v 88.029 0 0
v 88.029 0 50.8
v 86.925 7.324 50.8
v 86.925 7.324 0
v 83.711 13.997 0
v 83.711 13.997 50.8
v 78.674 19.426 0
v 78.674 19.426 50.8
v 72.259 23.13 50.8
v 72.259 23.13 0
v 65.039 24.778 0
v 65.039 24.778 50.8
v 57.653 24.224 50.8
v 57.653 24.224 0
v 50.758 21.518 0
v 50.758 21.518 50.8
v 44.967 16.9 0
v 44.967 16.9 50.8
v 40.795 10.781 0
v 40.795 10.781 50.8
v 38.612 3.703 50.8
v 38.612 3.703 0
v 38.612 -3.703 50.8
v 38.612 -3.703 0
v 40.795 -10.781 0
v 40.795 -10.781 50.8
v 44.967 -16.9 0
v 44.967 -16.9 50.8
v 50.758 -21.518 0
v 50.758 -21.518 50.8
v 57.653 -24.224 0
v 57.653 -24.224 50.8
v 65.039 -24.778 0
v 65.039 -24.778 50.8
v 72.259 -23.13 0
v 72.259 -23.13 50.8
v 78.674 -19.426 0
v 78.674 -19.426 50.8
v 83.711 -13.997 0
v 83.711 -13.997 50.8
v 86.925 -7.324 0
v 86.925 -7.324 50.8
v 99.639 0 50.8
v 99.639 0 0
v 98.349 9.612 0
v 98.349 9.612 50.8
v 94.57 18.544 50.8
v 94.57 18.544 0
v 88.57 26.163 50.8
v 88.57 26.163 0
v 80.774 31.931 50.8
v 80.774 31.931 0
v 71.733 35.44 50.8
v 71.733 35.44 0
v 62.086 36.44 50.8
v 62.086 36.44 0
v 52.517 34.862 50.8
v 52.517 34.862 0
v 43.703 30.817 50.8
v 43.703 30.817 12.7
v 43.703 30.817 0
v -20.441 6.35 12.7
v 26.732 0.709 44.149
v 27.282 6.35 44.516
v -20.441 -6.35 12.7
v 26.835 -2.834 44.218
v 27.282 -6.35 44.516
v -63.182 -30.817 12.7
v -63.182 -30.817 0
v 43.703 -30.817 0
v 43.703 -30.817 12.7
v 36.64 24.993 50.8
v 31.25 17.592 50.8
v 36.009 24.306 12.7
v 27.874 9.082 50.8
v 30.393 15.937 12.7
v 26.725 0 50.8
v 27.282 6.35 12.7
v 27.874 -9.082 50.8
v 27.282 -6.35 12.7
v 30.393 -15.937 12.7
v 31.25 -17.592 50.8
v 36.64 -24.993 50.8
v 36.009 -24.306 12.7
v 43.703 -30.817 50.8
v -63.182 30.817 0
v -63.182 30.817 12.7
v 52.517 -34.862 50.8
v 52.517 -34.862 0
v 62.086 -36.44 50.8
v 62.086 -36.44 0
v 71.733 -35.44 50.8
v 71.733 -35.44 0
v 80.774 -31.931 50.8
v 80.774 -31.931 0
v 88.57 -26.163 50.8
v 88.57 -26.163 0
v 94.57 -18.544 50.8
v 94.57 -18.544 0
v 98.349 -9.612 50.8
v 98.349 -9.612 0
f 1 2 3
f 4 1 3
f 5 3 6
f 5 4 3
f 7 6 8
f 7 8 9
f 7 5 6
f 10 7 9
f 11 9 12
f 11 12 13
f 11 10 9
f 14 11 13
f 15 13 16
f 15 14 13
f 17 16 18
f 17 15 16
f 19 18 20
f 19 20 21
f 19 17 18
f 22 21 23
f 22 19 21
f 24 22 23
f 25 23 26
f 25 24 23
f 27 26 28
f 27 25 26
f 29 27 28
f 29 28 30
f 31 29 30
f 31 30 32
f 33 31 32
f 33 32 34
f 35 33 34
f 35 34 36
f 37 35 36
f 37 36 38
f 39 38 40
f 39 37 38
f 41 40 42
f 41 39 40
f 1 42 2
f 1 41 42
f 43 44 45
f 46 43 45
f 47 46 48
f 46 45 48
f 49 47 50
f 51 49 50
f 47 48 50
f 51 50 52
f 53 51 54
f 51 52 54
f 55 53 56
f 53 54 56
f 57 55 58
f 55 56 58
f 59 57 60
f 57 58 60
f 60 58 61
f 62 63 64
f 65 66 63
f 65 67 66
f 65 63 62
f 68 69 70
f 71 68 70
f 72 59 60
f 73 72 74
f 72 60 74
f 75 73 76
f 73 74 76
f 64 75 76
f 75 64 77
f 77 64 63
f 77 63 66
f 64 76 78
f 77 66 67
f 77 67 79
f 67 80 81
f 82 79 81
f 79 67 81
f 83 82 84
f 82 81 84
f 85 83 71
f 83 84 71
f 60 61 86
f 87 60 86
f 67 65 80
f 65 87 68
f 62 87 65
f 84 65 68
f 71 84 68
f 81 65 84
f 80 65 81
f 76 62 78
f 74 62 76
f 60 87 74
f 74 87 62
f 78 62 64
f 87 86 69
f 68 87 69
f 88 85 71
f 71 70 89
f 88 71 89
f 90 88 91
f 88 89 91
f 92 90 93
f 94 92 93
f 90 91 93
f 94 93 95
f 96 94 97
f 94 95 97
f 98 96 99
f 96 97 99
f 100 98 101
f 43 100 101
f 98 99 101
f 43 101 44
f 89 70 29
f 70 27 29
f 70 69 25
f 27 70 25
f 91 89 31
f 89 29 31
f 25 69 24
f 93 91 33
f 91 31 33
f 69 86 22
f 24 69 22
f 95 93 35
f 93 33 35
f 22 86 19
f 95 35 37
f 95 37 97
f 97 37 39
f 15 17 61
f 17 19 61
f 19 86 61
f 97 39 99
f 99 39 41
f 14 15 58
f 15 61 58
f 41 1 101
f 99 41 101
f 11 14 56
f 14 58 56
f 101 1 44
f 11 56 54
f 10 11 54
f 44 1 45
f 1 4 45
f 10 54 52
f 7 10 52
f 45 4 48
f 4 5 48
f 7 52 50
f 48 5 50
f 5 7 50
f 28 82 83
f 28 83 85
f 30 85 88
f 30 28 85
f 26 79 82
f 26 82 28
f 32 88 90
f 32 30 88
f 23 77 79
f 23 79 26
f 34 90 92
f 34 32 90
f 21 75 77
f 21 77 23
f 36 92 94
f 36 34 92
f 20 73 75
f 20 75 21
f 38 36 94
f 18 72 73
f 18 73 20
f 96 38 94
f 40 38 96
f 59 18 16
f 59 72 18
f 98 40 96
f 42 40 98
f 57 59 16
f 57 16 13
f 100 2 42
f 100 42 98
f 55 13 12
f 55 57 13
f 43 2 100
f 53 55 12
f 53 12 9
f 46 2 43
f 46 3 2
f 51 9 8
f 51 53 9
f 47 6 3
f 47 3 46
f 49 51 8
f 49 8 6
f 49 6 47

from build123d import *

# Parameters (mm, degrees)
F0_R     = 24.847219
F1_DEPTH = 50.8
F2_DEPTH = 12.7
F4_DEPTH = 6.35


with BuildPart() as f1:
    # F0 (on Top) → F1 (new body)
    with BuildSketch(Plane.XY):
        with BuildLine():
            ThreePointArc((99.638521, 0), (80.773834, 31.931442), (43.702941, 30.816859))
            ThreePointArc((43.702941, 30.816859), (26.724861, 0), (43.702941, -30.816859))
            ThreePointArc((43.702941, -30.816859), (80.773834, -31.931442), (99.638521, 0))
        make_face()
        with Locations((63.181691, 0)):
            Circle(F0_R, mode=Mode.SUBTRACT)
    extrude(amount=F1_DEPTH)

    # F0 (on Top) → F2 (join)
    with BuildSketch(Plane.XY):
        with BuildLine():
            Line((43.702941, 30.816859), (-63.181691, 30.816859))
            Line((-63.181691, 30.816859), (-63.181691, -30.816859))
            Line((-63.181691, -30.816859), (43.702941, -30.816859))
            ThreePointArc((43.702941, -30.816859), (26.724861, 0), (43.702941, 30.816859))
        make_face()
    extrude(amount=F2_DEPTH)

    # F3 (on Front) → F4 (join, symmetric)
    with BuildSketch(Plane.XZ):
        Polygon((30.64096, 11.108877), (30.64096, 46.754934), (-22.828124, 11.108877), align=None)
    extrude(amount=F4_DEPTH, both=True)


solid = f1.part
